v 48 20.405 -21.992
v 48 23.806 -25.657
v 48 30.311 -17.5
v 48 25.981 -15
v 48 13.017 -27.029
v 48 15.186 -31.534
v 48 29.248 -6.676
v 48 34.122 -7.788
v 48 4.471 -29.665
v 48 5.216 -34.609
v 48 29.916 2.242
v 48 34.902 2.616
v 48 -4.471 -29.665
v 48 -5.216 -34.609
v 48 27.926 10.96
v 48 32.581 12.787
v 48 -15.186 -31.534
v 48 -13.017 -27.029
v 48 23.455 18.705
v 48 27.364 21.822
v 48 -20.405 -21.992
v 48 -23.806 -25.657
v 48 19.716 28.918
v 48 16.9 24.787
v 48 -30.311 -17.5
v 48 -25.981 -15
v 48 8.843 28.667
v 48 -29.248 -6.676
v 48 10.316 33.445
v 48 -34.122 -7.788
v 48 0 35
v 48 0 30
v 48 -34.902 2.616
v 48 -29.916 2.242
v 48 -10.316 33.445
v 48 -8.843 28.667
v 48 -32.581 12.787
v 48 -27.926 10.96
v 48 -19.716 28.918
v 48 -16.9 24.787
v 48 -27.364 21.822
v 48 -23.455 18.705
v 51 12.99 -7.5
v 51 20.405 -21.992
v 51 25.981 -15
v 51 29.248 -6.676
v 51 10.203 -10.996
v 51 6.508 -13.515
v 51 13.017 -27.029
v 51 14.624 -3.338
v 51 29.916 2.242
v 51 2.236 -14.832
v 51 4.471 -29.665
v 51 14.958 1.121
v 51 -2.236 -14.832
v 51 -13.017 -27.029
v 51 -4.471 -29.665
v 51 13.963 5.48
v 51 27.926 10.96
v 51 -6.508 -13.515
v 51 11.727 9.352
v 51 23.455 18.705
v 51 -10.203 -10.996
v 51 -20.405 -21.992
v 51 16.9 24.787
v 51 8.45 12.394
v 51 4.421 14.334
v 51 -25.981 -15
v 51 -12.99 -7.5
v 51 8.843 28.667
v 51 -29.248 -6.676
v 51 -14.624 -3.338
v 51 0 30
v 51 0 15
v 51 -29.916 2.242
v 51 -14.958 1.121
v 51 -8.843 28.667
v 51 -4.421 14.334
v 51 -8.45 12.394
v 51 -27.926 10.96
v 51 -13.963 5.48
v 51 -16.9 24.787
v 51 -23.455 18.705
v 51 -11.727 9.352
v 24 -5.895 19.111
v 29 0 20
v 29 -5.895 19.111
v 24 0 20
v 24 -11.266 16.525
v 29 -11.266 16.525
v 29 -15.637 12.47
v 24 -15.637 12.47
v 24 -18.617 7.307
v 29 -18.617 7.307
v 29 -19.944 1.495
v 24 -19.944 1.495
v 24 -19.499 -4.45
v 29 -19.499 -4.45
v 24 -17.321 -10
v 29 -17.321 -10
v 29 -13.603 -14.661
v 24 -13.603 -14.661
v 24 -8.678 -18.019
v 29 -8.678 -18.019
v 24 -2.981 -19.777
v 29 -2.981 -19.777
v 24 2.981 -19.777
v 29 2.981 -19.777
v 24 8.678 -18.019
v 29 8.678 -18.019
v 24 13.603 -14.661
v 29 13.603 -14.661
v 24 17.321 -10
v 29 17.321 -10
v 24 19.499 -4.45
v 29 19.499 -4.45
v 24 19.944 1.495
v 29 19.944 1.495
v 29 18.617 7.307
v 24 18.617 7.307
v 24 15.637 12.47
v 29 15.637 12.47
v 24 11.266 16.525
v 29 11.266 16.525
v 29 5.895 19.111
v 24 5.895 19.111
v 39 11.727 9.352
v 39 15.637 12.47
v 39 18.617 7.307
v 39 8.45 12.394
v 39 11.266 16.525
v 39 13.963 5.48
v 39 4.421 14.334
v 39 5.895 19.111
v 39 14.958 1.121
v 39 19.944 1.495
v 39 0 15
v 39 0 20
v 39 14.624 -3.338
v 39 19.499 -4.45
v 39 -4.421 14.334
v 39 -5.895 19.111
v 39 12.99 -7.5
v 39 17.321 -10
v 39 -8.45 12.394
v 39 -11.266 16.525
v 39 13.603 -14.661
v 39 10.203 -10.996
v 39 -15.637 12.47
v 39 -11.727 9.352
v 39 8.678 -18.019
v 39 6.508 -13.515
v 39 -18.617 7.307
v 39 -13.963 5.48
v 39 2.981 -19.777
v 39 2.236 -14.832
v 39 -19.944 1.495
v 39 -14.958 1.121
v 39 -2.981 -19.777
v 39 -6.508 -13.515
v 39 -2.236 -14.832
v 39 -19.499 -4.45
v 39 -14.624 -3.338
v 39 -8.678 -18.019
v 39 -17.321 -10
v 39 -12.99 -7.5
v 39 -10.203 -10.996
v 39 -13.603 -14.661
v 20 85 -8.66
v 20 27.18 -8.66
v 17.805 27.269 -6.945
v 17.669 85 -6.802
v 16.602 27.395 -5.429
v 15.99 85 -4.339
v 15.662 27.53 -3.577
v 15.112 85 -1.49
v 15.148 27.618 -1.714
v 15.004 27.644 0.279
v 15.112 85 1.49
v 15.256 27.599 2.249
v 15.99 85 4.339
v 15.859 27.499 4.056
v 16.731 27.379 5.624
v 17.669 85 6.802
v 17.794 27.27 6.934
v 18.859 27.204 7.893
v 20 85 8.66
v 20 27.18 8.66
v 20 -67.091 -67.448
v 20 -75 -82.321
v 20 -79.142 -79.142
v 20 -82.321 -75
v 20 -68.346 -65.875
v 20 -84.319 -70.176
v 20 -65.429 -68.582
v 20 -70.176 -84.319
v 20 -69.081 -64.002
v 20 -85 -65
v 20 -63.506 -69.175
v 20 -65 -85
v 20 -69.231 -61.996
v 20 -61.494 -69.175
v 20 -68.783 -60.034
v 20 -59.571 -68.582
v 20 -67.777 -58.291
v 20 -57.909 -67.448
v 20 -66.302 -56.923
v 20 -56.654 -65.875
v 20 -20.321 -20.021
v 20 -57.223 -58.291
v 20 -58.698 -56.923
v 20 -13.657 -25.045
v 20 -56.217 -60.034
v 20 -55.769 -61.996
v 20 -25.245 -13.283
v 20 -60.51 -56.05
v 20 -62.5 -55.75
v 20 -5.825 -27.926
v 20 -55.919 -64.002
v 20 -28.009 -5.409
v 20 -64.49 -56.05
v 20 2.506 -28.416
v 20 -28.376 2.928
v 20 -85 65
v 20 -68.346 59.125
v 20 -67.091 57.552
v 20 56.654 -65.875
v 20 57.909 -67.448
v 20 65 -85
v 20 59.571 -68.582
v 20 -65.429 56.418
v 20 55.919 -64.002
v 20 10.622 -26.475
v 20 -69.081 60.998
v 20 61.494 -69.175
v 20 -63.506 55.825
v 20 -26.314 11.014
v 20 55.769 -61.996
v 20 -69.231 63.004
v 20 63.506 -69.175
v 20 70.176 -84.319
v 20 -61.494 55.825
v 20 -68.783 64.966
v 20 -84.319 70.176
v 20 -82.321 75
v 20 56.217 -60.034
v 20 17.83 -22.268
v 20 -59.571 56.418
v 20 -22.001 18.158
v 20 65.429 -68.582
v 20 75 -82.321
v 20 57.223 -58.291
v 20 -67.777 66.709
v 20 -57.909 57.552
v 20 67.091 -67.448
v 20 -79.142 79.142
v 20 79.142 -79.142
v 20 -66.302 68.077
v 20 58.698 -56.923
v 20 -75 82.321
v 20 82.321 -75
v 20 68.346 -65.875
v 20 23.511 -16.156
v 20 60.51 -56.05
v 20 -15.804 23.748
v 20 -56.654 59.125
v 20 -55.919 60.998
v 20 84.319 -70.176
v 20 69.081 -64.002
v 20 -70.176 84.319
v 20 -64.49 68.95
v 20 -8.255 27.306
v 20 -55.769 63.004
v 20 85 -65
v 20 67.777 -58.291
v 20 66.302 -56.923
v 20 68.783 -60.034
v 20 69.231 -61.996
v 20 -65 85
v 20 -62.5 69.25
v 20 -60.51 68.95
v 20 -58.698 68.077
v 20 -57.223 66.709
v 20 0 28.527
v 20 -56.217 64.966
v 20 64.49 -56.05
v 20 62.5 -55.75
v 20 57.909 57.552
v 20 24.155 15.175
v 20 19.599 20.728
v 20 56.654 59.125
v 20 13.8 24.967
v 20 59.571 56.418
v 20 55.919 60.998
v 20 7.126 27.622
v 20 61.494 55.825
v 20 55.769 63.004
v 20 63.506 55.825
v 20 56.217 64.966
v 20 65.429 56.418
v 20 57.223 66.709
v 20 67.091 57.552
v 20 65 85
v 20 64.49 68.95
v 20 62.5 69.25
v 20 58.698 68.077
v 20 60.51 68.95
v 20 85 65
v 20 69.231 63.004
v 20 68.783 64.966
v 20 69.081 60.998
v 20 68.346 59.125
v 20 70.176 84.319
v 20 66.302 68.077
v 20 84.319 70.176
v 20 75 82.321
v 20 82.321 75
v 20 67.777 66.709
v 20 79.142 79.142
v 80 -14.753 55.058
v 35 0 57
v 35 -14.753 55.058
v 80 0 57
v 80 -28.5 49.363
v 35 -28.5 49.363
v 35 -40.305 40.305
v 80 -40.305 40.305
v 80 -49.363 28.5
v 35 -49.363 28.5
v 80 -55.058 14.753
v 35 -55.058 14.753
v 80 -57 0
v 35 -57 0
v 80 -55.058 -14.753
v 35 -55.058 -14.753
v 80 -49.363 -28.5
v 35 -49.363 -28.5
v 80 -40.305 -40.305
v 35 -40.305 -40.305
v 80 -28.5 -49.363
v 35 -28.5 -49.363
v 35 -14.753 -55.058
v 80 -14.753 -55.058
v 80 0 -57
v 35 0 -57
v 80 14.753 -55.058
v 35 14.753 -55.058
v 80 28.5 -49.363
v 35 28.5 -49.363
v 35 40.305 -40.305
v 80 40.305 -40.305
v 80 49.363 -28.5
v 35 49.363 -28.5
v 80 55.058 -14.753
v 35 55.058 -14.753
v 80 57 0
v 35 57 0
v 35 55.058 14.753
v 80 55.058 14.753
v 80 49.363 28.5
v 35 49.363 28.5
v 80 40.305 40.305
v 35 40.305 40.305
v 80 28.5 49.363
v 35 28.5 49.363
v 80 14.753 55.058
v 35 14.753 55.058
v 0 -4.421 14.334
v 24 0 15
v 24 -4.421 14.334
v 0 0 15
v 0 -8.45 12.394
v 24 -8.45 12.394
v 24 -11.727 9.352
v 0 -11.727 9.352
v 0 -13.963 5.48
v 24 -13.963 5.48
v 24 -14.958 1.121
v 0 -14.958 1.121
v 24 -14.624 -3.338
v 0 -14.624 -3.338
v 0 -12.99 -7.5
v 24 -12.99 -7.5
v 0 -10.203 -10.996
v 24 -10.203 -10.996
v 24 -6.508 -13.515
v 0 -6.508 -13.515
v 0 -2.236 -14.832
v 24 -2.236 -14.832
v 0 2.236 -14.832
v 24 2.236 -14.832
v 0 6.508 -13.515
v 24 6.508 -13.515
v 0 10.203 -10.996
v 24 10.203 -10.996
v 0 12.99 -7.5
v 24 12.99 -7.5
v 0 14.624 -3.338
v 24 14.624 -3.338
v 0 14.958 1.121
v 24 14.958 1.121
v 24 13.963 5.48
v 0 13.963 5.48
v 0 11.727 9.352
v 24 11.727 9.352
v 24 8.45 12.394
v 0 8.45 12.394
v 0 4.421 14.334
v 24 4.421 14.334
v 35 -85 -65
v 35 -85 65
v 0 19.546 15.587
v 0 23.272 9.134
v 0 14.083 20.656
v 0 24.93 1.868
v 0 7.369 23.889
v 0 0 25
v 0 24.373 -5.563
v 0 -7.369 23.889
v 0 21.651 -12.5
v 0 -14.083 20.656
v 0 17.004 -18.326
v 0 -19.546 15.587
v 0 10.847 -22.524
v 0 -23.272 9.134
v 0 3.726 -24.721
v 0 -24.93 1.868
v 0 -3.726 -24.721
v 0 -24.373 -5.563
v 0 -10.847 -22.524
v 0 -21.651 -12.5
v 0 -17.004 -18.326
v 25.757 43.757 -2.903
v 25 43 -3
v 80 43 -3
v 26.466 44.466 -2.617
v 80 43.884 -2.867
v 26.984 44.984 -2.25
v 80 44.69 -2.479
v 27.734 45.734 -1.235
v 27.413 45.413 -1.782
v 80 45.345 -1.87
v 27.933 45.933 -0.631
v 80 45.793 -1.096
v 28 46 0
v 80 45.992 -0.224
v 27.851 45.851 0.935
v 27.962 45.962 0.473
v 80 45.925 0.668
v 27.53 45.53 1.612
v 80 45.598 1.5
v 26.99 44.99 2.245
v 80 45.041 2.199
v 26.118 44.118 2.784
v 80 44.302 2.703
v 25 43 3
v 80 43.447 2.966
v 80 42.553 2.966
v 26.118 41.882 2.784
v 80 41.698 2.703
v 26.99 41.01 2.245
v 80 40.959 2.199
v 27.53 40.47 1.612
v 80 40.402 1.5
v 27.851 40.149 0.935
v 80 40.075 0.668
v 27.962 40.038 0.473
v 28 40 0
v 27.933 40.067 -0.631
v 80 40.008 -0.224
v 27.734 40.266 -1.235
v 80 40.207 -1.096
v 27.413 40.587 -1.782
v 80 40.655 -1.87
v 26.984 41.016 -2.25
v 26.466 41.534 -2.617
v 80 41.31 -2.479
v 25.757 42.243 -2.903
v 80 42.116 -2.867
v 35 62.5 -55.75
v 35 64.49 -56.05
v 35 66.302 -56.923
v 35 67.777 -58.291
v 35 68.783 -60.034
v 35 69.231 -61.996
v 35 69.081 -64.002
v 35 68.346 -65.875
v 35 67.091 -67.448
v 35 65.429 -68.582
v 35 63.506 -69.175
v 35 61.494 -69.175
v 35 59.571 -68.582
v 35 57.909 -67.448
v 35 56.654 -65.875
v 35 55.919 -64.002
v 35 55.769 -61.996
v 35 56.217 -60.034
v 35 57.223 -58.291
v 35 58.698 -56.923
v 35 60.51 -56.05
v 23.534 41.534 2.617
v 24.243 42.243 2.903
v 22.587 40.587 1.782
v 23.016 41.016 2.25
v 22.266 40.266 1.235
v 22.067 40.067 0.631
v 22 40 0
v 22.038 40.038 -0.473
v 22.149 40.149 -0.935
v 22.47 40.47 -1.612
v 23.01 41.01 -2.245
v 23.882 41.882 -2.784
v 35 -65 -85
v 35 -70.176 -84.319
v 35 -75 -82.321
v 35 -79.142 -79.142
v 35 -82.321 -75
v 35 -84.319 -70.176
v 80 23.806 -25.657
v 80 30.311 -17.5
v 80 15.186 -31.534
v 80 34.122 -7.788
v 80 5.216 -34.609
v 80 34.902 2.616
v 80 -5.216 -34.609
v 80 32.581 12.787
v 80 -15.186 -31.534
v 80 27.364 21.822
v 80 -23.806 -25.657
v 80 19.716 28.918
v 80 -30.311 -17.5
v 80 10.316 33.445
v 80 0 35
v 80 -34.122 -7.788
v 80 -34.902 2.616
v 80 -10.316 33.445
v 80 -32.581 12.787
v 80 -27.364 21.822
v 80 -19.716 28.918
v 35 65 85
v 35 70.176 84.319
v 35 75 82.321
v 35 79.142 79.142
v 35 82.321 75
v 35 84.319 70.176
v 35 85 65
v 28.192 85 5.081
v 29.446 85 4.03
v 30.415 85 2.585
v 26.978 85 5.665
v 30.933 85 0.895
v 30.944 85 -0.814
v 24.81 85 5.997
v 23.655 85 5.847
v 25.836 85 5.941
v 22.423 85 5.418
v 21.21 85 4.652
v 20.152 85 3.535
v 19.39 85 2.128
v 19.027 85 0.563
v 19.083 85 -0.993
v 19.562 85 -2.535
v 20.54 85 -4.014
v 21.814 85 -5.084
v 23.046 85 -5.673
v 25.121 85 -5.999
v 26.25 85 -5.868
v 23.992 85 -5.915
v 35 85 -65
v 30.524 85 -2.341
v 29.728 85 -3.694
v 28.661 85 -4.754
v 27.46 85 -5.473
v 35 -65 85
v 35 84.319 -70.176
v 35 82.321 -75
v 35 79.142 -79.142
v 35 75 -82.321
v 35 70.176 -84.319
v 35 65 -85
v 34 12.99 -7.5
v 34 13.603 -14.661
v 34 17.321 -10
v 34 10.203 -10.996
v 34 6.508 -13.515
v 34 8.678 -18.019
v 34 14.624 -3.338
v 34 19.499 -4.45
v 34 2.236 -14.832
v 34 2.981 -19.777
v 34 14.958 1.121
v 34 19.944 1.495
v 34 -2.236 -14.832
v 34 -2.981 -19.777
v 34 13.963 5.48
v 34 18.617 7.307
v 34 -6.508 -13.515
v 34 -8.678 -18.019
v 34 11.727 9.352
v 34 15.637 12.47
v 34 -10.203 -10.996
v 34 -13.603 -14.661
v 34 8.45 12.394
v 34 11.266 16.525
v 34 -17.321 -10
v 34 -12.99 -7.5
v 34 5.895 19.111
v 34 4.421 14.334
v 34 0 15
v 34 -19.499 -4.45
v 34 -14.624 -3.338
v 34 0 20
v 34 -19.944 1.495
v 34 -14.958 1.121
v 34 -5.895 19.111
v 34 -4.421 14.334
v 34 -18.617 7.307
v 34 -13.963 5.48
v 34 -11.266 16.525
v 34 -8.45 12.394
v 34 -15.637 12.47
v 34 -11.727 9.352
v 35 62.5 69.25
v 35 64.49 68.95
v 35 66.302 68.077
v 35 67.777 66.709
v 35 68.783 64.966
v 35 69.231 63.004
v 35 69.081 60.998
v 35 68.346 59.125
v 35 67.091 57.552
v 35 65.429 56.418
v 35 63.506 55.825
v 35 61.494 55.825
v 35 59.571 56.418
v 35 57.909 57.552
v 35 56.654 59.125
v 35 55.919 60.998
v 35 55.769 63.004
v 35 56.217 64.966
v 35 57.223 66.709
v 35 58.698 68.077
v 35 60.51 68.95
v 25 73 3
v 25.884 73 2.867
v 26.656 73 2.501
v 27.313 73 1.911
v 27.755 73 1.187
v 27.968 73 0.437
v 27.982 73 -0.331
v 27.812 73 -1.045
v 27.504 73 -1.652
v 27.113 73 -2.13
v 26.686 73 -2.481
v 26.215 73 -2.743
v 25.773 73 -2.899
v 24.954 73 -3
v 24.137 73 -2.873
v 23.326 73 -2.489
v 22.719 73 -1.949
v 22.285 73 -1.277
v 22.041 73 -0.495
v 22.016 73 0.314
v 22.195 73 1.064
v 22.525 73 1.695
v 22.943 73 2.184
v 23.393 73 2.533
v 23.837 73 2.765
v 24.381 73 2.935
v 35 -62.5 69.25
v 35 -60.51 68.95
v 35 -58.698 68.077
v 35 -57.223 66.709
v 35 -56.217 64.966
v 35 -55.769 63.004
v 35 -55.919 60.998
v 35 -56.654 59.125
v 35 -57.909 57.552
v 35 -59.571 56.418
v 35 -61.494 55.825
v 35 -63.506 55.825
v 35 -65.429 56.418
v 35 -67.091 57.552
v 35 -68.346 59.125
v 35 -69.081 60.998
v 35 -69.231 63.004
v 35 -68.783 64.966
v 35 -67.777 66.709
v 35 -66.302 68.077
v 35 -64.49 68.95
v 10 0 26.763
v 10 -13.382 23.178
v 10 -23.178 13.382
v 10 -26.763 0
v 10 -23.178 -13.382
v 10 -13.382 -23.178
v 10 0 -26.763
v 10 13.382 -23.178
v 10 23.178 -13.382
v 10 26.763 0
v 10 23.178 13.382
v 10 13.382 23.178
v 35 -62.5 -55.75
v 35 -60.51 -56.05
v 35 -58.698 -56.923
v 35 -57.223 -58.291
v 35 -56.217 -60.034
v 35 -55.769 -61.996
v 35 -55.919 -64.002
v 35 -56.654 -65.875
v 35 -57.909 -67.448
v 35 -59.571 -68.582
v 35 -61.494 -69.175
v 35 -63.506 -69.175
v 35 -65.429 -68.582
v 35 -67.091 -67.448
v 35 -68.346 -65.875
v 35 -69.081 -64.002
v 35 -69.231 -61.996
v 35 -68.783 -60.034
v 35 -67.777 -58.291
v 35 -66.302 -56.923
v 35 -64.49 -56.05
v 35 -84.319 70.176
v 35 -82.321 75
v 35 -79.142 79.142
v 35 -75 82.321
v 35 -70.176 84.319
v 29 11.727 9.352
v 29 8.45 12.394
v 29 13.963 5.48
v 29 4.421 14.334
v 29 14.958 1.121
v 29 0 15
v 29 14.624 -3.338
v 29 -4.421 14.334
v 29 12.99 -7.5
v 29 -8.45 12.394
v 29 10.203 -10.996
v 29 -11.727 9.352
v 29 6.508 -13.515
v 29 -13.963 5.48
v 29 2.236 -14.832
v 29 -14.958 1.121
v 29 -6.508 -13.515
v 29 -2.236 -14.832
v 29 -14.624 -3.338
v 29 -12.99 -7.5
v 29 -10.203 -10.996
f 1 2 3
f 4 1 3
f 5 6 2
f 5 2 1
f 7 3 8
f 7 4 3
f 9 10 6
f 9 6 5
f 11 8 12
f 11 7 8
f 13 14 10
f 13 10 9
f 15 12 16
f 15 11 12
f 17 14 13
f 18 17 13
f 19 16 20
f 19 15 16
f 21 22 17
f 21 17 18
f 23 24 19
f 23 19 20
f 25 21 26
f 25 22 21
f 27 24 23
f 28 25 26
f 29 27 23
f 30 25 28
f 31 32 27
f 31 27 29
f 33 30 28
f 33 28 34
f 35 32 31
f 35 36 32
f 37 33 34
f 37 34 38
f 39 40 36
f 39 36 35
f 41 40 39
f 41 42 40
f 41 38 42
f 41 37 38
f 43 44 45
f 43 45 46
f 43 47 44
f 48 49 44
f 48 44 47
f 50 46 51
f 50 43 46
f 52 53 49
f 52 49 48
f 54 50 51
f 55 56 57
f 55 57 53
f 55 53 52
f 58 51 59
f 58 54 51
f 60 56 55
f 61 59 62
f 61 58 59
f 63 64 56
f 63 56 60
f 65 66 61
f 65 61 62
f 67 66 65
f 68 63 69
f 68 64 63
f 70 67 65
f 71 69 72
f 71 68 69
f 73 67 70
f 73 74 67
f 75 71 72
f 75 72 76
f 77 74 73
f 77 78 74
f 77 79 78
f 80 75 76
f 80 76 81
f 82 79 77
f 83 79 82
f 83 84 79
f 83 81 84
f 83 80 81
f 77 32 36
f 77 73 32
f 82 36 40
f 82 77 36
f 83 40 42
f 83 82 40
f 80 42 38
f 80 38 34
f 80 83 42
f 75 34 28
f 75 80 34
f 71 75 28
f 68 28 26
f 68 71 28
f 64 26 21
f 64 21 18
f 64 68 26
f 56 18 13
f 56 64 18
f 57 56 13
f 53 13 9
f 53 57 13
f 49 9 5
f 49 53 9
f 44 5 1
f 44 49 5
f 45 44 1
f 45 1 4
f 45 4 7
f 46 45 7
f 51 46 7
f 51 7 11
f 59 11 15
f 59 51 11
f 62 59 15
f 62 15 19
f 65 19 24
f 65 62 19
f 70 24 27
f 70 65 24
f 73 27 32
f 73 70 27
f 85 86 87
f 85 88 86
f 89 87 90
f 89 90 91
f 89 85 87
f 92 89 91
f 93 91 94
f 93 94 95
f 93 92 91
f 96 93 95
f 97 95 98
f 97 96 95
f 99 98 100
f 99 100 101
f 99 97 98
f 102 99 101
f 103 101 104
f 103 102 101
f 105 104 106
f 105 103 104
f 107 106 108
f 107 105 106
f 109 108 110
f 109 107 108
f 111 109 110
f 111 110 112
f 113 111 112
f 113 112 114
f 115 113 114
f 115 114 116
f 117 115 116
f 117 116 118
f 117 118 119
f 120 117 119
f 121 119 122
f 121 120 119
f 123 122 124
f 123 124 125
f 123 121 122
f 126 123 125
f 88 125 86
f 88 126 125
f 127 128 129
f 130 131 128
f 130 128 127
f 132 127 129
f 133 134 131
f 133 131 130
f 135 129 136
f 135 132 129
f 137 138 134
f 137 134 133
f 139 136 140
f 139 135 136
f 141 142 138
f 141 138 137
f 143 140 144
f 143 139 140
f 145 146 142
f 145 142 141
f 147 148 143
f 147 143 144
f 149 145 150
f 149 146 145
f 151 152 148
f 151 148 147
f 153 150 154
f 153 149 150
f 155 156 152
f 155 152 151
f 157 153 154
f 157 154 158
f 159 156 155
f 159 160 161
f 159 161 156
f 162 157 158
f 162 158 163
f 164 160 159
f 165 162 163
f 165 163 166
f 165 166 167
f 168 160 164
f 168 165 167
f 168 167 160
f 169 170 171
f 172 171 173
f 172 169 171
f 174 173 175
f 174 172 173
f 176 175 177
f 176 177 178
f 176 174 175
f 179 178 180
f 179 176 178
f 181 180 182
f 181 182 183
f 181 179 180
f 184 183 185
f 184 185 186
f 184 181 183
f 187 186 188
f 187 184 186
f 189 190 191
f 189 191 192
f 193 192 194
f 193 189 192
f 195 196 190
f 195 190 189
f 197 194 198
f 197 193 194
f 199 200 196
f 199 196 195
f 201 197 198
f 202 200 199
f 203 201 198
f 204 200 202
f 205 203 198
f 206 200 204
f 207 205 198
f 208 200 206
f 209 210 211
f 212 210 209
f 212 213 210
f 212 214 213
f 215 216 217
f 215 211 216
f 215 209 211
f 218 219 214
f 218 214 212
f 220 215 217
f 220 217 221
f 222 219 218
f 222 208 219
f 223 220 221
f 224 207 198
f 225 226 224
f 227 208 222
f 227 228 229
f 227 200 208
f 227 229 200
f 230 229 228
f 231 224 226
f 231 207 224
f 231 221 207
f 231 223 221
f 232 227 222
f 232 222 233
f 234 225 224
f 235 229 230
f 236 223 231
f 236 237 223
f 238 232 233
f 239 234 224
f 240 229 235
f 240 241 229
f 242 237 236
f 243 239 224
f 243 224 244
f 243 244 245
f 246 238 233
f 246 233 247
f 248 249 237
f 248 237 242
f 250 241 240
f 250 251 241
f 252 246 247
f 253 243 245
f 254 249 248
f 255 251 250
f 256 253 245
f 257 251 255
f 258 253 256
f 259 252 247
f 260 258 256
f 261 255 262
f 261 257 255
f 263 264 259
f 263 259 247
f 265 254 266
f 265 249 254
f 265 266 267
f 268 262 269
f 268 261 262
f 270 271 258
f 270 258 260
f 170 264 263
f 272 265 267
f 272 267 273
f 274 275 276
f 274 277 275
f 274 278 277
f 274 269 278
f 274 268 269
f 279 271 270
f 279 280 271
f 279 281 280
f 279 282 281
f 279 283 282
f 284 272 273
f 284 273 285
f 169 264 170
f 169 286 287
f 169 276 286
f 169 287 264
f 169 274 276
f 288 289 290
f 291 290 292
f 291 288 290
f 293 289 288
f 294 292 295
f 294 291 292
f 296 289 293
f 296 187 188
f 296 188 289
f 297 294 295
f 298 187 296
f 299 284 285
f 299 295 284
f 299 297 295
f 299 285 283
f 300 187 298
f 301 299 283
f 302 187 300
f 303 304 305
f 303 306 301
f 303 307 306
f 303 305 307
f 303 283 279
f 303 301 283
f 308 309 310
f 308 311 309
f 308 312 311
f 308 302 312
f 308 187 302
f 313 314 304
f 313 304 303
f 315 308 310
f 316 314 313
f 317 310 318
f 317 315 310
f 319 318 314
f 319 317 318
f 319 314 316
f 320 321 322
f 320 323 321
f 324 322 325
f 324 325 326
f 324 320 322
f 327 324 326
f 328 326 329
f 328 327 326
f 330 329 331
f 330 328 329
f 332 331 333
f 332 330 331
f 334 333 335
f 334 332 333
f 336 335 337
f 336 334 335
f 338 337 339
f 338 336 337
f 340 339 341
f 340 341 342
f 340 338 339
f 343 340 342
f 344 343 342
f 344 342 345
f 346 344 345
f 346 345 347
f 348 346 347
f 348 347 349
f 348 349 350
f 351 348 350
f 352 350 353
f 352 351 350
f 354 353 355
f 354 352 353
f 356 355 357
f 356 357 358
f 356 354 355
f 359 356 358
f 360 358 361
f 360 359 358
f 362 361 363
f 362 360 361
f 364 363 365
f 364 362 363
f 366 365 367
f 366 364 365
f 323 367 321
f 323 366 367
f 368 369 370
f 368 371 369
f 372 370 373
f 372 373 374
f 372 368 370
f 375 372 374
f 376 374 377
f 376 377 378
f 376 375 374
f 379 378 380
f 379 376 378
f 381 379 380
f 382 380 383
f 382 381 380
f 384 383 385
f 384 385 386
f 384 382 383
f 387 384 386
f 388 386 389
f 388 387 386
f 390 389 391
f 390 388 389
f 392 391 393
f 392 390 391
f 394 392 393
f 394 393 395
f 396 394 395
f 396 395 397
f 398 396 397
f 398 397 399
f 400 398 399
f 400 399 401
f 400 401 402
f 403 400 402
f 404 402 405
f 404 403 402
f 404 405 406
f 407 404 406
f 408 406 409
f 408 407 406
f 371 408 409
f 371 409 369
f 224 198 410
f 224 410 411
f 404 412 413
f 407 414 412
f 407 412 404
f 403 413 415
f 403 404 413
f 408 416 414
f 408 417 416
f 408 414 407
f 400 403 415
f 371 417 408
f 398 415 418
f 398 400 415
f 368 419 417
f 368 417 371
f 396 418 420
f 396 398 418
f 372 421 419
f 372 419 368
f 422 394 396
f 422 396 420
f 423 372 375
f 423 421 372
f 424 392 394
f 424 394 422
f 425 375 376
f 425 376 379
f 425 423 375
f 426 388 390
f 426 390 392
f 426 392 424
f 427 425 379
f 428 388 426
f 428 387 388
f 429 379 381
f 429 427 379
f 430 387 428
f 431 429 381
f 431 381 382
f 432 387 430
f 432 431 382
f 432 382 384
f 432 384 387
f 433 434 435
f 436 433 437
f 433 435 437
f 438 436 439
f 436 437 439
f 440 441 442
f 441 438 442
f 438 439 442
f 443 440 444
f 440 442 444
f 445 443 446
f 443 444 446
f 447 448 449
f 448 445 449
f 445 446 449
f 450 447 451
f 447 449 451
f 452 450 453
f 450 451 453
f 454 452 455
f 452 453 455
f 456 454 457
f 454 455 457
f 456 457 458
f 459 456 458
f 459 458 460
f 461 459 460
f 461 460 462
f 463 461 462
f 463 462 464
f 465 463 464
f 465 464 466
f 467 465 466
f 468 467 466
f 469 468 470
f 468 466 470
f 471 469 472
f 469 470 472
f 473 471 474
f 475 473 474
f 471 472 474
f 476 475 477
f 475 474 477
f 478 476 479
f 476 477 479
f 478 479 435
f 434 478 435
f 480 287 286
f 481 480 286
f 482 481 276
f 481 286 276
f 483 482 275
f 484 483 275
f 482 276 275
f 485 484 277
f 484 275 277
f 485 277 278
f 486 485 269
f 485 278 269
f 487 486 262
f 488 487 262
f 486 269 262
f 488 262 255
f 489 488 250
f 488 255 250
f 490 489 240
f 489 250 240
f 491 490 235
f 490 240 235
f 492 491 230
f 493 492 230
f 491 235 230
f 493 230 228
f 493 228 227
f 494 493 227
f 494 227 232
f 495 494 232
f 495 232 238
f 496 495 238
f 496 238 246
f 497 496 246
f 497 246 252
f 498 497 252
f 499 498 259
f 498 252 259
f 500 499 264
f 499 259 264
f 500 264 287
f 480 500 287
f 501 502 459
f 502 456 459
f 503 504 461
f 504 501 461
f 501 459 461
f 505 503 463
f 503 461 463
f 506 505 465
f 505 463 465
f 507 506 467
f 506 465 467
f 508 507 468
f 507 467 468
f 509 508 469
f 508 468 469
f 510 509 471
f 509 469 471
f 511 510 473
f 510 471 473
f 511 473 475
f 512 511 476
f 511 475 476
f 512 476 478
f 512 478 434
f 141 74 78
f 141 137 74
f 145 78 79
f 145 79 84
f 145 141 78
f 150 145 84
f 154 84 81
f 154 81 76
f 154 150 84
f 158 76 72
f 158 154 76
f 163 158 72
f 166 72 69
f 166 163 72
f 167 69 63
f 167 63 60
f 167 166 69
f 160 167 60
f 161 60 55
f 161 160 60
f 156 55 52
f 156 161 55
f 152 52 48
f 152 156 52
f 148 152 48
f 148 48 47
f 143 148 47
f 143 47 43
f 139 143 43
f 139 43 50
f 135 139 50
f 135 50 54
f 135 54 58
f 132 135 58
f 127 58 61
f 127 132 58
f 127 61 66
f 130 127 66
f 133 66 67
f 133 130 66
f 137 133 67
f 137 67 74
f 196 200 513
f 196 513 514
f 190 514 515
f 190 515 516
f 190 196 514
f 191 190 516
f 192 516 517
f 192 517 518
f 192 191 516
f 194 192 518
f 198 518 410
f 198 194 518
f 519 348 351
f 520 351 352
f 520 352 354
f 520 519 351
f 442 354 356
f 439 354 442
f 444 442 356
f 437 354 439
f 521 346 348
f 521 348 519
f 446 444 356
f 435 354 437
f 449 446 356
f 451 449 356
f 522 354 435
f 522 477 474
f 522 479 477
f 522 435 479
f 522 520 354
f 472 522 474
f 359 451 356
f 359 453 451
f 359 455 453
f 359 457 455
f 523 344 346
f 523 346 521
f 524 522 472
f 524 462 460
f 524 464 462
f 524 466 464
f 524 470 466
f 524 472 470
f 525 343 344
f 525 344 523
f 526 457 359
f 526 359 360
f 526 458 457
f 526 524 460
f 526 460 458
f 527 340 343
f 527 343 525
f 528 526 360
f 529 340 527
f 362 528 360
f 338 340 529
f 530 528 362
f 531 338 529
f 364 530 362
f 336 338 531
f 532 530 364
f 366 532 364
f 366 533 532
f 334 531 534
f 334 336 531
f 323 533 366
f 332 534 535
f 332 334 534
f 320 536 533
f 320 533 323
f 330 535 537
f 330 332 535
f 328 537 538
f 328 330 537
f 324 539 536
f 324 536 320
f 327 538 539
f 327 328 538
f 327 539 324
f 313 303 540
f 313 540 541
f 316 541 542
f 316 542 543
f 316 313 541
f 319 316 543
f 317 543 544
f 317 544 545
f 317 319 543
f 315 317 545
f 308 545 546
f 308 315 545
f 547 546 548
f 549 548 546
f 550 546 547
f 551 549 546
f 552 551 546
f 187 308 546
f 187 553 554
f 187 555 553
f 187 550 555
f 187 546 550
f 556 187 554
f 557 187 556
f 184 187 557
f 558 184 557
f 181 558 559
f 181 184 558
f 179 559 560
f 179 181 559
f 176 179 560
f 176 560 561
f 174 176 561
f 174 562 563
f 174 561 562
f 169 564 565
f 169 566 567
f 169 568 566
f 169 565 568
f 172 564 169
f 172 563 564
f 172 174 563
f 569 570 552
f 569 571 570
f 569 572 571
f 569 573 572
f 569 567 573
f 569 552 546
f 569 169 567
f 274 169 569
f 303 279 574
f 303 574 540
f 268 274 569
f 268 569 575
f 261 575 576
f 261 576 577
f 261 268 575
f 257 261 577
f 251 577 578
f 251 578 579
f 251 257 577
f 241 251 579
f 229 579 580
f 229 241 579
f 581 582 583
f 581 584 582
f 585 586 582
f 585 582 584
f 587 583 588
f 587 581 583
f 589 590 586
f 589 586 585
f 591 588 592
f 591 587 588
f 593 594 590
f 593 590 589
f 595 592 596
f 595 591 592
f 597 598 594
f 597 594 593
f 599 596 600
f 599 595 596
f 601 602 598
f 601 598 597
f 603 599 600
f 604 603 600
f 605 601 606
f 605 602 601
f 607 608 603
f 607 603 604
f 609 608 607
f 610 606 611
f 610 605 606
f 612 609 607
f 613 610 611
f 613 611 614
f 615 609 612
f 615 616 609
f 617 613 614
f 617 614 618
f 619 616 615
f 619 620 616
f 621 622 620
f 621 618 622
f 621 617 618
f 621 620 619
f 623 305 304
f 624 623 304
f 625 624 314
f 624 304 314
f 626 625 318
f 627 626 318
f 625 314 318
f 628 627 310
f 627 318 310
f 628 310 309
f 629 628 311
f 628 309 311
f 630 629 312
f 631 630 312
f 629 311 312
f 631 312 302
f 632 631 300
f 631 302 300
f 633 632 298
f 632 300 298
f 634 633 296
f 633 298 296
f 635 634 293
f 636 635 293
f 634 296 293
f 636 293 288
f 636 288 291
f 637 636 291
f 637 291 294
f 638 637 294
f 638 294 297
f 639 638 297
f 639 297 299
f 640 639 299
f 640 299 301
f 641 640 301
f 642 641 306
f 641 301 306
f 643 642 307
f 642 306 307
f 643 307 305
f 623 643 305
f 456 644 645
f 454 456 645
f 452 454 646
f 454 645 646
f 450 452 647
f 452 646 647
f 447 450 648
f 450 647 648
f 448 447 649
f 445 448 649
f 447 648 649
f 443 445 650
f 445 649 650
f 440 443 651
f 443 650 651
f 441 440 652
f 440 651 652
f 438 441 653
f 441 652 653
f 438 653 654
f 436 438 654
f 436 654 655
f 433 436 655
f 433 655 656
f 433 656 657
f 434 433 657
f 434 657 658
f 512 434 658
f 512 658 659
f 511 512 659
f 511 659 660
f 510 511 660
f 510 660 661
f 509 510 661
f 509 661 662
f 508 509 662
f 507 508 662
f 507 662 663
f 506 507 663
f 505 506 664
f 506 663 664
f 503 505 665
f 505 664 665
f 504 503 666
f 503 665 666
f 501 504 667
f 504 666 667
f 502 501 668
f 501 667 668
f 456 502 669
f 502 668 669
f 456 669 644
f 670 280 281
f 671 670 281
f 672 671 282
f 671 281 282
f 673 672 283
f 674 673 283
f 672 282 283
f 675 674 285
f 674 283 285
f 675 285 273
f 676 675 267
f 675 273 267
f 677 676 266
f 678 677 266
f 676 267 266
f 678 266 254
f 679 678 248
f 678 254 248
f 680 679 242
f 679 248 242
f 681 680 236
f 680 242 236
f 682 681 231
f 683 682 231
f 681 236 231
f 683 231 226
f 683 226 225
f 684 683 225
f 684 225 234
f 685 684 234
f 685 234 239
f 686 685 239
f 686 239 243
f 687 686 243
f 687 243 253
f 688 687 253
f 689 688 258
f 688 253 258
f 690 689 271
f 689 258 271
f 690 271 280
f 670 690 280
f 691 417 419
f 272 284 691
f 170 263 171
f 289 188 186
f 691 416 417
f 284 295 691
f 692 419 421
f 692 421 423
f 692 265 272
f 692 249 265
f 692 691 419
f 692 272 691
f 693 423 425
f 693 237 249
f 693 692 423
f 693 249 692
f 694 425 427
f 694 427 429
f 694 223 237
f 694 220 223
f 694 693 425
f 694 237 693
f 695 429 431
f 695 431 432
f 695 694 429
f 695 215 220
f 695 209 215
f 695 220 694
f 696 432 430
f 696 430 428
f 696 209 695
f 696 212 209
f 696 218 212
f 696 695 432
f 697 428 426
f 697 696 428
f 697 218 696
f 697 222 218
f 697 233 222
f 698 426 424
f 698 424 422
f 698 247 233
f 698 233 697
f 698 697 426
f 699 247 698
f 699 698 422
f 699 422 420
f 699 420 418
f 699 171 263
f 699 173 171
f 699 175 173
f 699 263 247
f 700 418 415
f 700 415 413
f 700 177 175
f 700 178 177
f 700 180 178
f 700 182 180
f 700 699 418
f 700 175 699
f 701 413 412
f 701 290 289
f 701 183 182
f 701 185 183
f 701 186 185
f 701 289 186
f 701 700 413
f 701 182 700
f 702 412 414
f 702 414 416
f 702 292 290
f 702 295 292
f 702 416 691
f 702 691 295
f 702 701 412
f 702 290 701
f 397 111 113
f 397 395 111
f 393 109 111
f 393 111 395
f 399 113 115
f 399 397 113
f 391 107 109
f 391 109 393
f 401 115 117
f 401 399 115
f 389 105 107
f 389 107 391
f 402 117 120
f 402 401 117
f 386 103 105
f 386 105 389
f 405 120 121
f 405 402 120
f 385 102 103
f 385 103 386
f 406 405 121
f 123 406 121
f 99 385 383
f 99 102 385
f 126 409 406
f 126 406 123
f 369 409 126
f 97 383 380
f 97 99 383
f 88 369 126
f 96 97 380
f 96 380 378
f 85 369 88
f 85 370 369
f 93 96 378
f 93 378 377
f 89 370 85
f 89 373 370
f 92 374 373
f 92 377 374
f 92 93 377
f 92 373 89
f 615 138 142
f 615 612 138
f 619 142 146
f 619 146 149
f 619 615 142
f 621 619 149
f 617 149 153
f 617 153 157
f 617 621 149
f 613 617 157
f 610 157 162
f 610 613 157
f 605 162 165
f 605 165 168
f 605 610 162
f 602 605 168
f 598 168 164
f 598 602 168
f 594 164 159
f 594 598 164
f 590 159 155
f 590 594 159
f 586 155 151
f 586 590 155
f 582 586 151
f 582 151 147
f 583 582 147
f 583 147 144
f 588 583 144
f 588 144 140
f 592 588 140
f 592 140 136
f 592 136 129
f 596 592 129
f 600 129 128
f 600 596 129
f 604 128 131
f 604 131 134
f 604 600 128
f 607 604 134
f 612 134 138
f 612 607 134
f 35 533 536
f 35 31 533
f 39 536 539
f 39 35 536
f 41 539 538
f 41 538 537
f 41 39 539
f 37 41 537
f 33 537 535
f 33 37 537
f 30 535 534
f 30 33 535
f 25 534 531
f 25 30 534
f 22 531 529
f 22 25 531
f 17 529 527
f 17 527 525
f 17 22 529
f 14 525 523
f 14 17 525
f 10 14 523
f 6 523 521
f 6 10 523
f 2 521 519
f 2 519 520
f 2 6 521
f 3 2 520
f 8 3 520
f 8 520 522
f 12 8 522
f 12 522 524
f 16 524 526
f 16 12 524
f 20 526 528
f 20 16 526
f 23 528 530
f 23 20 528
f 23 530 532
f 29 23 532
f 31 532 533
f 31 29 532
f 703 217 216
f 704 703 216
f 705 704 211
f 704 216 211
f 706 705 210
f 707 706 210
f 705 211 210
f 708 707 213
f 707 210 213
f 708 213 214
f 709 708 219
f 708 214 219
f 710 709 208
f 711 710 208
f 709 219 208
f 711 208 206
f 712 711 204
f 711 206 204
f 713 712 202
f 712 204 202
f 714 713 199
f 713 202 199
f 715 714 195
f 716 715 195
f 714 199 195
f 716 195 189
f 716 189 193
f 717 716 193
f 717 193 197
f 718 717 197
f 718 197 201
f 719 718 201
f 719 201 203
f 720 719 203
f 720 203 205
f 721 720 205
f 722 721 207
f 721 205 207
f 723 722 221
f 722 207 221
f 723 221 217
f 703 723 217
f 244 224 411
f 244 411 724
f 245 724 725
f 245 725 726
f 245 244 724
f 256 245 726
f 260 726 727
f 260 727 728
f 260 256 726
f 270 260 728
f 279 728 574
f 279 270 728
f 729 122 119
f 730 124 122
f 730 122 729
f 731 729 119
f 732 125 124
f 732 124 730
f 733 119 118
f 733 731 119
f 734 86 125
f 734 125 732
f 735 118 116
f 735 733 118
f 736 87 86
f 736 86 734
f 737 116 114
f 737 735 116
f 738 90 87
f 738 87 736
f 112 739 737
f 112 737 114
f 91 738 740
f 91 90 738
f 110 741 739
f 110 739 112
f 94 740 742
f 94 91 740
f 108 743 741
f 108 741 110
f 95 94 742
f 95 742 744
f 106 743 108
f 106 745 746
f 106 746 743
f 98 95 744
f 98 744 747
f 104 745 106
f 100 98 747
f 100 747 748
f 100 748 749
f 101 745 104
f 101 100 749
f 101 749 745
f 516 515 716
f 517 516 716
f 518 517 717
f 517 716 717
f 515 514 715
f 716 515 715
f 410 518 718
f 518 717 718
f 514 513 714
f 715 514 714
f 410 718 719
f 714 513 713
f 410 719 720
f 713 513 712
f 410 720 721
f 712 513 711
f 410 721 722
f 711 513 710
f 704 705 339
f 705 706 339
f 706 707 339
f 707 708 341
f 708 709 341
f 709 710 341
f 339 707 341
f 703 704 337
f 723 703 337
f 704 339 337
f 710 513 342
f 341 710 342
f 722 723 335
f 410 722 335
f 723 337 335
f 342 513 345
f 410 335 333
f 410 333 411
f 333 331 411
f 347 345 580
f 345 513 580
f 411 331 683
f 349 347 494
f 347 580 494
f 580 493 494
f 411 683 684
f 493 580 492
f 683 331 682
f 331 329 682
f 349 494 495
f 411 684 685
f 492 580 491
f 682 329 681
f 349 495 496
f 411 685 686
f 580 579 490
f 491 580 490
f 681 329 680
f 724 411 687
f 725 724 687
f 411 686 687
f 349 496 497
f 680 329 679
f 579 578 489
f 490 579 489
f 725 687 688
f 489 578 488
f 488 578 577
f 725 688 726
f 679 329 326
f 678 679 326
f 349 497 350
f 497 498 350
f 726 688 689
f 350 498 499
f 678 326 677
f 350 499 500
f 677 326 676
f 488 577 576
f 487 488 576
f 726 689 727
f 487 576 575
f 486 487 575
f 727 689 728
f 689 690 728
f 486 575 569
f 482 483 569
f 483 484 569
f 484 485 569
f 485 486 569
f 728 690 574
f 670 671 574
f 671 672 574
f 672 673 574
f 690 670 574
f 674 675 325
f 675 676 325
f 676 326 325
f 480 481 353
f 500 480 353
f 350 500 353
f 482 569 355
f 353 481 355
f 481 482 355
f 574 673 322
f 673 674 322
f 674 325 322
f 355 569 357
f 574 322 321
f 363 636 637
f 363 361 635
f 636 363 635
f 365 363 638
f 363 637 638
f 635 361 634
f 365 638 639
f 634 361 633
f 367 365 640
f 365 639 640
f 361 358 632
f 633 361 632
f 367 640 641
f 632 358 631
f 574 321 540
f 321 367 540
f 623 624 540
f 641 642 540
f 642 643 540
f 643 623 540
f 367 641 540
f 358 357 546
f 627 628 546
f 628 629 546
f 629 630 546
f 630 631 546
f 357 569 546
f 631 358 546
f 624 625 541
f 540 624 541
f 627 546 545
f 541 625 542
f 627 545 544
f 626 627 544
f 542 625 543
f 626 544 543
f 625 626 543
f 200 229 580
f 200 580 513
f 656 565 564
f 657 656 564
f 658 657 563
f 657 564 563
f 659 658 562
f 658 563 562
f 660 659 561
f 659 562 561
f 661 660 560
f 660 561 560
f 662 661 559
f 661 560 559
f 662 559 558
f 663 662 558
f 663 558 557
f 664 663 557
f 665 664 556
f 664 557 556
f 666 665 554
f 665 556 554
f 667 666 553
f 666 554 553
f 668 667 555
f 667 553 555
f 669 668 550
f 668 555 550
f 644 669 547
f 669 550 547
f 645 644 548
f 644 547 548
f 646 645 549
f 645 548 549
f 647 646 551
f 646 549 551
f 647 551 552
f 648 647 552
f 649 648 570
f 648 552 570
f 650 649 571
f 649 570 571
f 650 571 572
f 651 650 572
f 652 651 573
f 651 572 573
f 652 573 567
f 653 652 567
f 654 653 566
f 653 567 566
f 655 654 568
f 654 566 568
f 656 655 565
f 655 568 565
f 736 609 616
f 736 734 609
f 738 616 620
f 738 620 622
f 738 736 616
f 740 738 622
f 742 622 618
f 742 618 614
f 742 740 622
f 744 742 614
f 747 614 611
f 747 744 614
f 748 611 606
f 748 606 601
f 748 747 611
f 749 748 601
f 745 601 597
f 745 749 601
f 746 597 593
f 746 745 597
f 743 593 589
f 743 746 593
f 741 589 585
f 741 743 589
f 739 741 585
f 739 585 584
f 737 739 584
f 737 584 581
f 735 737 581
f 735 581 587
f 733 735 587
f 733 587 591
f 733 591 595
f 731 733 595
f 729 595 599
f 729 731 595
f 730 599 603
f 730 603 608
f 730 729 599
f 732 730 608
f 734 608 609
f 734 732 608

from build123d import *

# Parameters (mm, degrees)
SKETCH_2_R          = 6.75
SKETCH_2_R_2        = 20
EXTRUDE_1_DEPTH     = 15
EXTRUDE_2_REACH     = 208.216
SKETCH_3_R          = 10
SKETCH_6_R          = 3
CUT_EXTRUDE_1_DEPTH = 33
SKETCH_8_R          = 3
CUT_EXTRUDE_2_DEPTH = 58
EXTRUDE_START       = 6
EXTRUDE_3_DEPTH     = 6
EXTRUDE_4_DEPTH     = 58


with BuildPart() as part:
    # Эскиз1 → Повернуть1 (revolve)
    with BuildSketch(Plane.XY, mode=Mode.PRIVATE) as revolve_1_sk:
        Polygon((0, -15), (0, -25), (20, -28.526539614), (20, -57), (80, -57), (80, -35), (48, -35), (48, -30), (51, -30), (51, -15), (39, -15), (39, -20), (34, -20), (34, -15), (29, -15), (29, -20), (24, -20), (24, -15), align=None)
    revolve(revolve_1_sk.sketch.rotate(Axis((-987.033440026, 0, 0), (1, 0, 0)), 270), axis=Axis((-987.033440026, 0, 0), (1, 0, 0)))

    # Эскиз2 → Бобышка-Вытянуть1 (add)
    with BuildSketch(Plane.ZY.offset(-20)):
        with BuildLine():
            Line((-65, -85), (65, -85))
            ThreePointArc((65, -85), (79.142135624, -79.142135624), (85, -65))
            Line((85, -65), (85, 65))
            ThreePointArc((85, 65), (79.142135624, 79.142135624), (65, 85))
            Line((65, 85), (-65, 85))
            ThreePointArc((-65, 85), (-79.142135624, 79.142135624), (-85, 65))
            Line((-85, 65), (-85, -65))
            ThreePointArc((-85, -65), (-79.142135624, -79.142135624), (-65, -85))
        make_face()
        with Locations((-62.5, -62.5)):
            Circle(SKETCH_2_R, mode=Mode.SUBTRACT)
        with Locations((-62.5, 62.5)):
            Circle(SKETCH_2_R, mode=Mode.SUBTRACT)
        with Locations((62.5, 62.5)):
            Circle(SKETCH_2_R, mode=Mode.SUBTRACT)
        with Locations((62.5, -62.5)):
            Circle(SKETCH_2_R, mode=Mode.SUBTRACT)
        Circle(SKETCH_2_R_2, mode=Mode.SUBTRACT)
    extrude(amount=-EXTRUDE_1_DEPTH)

    # Эскиз3 → Бобышка-Вытянуть2 (add, up to next)
    with BuildSketch(Plane(origin=(0, 85, 0), x_dir=(1, 0, 0), z_dir=(0, 1, 0)), mode=Mode.PRIVATE) as extrude_2_sk1:
        with Locations((25, 0)):
            Circle(SKETCH_3_R)
    extrude_2_tool1 = extrude(extrude_2_sk1.sketch, amount=-EXTRUDE_2_REACH, mode=Mode.PRIVATE) - part.part
    add(extrude_2_tool1.solids().sort_by_distance((25, 85, 0))[0])

    # Вырез-По сечениям1: read off the stored shape, not the designer's step
    # Вырез-По сечениям1: loft between two sections, ruled curve by curve
    loft_1_from = [
        Edge.make_bspline([(25.773422165, 73, -2.898588994), (19.976244177, 73, -4.445433323), (18.429399848, 73, 1.351744665), (24.226577835, 73, 2.898588994), (30.023755823, 73, 4.445433323), (31.570600152, 73, -1.351744665), (25.773422165, 73, -2.898588994)], [0, 0, 0, 0, 0.5, 0.5, 0.5, 1, 1, 1, 1], 3, [1, 0.333333333, 0.333333333, 1, 0.333333333, 0.333333333, 1]),
    ]
    loft_1_to = [
        Edge.make_bspline([(23.045798977, 85, -5.672838651), (11.700121675, 85, -1.764436604), (15.608523722, 85, 9.581240698), (26.954201023, 85, 5.672838651), (38.299878325, 85, 1.764436604), (34.391476278, 85, -9.581240698), (23.045798977, 85, -5.672838651)], [0, 0, 0, 0, 0.5, 0.5, 0.5, 1, 1, 1, 1], 3, [1, 0.333333333, 0.333333333, 1, 0.333333333, 0.333333333, 1]),
    ]
    loft_1 = Solid(Shell([*[Face.make_surface_from_curves(loft_1_from[k], loft_1_to[k]) for k in range(1)], Face(Wire(loft_1_from)), Face(Wire(loft_1_to))]))
    add(loft_1, mode=Mode.SUBTRACT)

    # Эскиз6 → Вырез-Вытянуть1 (cut)
    with BuildSketch(Plane(origin=(0, 73, 0), x_dir=(1, 0, 0), z_dir=(0, 1, 0))):
        with Locations(Location((25, 0, 0), (0, 0, 270))):
            Circle(SKETCH_6_R)
    extrude(amount=-CUT_EXTRUDE_1_DEPTH, mode=Mode.SUBTRACT)

    # Эскиз8 → Вырез-Вытянуть2 (cut)
    with BuildSketch(Plane(origin=(80, 0, 0), x_dir=(0, 0, -1), z_dir=(1, 0, 0))):
        with Locations((0, 43)):
            Circle(SKETCH_8_R)
    extrude(amount=-CUT_EXTRUDE_2_DEPTH, mode=Mode.SUBTRACT)

    # Эскиз10 → Бобышка-Вытянуть3 (add)
    with BuildSketch(Plane(origin=(0, 40, 0), x_dir=(1, 0, 0), z_dir=(0, 1, 0)).offset(EXTRUDE_START)):
        with BuildLine():
            Line((25, 3), (25, 4.5))
            ThreePointArc((25, 4.5), (20.5, 0), (25, -4.5))
            Line((25, -4.5), (25, -3))
            ThreePointArc((25, -3), (22, 0), (25, 3))
        make_face()
    extrude(amount=-EXTRUDE_3_DEPTH)

    # Эскиз11 → Бобышка-Вытянуть4 (add)
    with BuildSketch(Plane(origin=(80, 0, 0), x_dir=(0, 0, -1), z_dir=(1, 0, 0))):
        with BuildLine():
            Line((3, 43), (4.5, 43))
            ThreePointArc((4.5, 43), (0, 38.5), (-4.5, 43))
            Line((-4.5, 43), (-3, 43))
            ThreePointArc((-3, 43), (0, 40), (3, 43))
        make_face()
    extrude(amount=-EXTRUDE_4_DEPTH)


solid = part.part
